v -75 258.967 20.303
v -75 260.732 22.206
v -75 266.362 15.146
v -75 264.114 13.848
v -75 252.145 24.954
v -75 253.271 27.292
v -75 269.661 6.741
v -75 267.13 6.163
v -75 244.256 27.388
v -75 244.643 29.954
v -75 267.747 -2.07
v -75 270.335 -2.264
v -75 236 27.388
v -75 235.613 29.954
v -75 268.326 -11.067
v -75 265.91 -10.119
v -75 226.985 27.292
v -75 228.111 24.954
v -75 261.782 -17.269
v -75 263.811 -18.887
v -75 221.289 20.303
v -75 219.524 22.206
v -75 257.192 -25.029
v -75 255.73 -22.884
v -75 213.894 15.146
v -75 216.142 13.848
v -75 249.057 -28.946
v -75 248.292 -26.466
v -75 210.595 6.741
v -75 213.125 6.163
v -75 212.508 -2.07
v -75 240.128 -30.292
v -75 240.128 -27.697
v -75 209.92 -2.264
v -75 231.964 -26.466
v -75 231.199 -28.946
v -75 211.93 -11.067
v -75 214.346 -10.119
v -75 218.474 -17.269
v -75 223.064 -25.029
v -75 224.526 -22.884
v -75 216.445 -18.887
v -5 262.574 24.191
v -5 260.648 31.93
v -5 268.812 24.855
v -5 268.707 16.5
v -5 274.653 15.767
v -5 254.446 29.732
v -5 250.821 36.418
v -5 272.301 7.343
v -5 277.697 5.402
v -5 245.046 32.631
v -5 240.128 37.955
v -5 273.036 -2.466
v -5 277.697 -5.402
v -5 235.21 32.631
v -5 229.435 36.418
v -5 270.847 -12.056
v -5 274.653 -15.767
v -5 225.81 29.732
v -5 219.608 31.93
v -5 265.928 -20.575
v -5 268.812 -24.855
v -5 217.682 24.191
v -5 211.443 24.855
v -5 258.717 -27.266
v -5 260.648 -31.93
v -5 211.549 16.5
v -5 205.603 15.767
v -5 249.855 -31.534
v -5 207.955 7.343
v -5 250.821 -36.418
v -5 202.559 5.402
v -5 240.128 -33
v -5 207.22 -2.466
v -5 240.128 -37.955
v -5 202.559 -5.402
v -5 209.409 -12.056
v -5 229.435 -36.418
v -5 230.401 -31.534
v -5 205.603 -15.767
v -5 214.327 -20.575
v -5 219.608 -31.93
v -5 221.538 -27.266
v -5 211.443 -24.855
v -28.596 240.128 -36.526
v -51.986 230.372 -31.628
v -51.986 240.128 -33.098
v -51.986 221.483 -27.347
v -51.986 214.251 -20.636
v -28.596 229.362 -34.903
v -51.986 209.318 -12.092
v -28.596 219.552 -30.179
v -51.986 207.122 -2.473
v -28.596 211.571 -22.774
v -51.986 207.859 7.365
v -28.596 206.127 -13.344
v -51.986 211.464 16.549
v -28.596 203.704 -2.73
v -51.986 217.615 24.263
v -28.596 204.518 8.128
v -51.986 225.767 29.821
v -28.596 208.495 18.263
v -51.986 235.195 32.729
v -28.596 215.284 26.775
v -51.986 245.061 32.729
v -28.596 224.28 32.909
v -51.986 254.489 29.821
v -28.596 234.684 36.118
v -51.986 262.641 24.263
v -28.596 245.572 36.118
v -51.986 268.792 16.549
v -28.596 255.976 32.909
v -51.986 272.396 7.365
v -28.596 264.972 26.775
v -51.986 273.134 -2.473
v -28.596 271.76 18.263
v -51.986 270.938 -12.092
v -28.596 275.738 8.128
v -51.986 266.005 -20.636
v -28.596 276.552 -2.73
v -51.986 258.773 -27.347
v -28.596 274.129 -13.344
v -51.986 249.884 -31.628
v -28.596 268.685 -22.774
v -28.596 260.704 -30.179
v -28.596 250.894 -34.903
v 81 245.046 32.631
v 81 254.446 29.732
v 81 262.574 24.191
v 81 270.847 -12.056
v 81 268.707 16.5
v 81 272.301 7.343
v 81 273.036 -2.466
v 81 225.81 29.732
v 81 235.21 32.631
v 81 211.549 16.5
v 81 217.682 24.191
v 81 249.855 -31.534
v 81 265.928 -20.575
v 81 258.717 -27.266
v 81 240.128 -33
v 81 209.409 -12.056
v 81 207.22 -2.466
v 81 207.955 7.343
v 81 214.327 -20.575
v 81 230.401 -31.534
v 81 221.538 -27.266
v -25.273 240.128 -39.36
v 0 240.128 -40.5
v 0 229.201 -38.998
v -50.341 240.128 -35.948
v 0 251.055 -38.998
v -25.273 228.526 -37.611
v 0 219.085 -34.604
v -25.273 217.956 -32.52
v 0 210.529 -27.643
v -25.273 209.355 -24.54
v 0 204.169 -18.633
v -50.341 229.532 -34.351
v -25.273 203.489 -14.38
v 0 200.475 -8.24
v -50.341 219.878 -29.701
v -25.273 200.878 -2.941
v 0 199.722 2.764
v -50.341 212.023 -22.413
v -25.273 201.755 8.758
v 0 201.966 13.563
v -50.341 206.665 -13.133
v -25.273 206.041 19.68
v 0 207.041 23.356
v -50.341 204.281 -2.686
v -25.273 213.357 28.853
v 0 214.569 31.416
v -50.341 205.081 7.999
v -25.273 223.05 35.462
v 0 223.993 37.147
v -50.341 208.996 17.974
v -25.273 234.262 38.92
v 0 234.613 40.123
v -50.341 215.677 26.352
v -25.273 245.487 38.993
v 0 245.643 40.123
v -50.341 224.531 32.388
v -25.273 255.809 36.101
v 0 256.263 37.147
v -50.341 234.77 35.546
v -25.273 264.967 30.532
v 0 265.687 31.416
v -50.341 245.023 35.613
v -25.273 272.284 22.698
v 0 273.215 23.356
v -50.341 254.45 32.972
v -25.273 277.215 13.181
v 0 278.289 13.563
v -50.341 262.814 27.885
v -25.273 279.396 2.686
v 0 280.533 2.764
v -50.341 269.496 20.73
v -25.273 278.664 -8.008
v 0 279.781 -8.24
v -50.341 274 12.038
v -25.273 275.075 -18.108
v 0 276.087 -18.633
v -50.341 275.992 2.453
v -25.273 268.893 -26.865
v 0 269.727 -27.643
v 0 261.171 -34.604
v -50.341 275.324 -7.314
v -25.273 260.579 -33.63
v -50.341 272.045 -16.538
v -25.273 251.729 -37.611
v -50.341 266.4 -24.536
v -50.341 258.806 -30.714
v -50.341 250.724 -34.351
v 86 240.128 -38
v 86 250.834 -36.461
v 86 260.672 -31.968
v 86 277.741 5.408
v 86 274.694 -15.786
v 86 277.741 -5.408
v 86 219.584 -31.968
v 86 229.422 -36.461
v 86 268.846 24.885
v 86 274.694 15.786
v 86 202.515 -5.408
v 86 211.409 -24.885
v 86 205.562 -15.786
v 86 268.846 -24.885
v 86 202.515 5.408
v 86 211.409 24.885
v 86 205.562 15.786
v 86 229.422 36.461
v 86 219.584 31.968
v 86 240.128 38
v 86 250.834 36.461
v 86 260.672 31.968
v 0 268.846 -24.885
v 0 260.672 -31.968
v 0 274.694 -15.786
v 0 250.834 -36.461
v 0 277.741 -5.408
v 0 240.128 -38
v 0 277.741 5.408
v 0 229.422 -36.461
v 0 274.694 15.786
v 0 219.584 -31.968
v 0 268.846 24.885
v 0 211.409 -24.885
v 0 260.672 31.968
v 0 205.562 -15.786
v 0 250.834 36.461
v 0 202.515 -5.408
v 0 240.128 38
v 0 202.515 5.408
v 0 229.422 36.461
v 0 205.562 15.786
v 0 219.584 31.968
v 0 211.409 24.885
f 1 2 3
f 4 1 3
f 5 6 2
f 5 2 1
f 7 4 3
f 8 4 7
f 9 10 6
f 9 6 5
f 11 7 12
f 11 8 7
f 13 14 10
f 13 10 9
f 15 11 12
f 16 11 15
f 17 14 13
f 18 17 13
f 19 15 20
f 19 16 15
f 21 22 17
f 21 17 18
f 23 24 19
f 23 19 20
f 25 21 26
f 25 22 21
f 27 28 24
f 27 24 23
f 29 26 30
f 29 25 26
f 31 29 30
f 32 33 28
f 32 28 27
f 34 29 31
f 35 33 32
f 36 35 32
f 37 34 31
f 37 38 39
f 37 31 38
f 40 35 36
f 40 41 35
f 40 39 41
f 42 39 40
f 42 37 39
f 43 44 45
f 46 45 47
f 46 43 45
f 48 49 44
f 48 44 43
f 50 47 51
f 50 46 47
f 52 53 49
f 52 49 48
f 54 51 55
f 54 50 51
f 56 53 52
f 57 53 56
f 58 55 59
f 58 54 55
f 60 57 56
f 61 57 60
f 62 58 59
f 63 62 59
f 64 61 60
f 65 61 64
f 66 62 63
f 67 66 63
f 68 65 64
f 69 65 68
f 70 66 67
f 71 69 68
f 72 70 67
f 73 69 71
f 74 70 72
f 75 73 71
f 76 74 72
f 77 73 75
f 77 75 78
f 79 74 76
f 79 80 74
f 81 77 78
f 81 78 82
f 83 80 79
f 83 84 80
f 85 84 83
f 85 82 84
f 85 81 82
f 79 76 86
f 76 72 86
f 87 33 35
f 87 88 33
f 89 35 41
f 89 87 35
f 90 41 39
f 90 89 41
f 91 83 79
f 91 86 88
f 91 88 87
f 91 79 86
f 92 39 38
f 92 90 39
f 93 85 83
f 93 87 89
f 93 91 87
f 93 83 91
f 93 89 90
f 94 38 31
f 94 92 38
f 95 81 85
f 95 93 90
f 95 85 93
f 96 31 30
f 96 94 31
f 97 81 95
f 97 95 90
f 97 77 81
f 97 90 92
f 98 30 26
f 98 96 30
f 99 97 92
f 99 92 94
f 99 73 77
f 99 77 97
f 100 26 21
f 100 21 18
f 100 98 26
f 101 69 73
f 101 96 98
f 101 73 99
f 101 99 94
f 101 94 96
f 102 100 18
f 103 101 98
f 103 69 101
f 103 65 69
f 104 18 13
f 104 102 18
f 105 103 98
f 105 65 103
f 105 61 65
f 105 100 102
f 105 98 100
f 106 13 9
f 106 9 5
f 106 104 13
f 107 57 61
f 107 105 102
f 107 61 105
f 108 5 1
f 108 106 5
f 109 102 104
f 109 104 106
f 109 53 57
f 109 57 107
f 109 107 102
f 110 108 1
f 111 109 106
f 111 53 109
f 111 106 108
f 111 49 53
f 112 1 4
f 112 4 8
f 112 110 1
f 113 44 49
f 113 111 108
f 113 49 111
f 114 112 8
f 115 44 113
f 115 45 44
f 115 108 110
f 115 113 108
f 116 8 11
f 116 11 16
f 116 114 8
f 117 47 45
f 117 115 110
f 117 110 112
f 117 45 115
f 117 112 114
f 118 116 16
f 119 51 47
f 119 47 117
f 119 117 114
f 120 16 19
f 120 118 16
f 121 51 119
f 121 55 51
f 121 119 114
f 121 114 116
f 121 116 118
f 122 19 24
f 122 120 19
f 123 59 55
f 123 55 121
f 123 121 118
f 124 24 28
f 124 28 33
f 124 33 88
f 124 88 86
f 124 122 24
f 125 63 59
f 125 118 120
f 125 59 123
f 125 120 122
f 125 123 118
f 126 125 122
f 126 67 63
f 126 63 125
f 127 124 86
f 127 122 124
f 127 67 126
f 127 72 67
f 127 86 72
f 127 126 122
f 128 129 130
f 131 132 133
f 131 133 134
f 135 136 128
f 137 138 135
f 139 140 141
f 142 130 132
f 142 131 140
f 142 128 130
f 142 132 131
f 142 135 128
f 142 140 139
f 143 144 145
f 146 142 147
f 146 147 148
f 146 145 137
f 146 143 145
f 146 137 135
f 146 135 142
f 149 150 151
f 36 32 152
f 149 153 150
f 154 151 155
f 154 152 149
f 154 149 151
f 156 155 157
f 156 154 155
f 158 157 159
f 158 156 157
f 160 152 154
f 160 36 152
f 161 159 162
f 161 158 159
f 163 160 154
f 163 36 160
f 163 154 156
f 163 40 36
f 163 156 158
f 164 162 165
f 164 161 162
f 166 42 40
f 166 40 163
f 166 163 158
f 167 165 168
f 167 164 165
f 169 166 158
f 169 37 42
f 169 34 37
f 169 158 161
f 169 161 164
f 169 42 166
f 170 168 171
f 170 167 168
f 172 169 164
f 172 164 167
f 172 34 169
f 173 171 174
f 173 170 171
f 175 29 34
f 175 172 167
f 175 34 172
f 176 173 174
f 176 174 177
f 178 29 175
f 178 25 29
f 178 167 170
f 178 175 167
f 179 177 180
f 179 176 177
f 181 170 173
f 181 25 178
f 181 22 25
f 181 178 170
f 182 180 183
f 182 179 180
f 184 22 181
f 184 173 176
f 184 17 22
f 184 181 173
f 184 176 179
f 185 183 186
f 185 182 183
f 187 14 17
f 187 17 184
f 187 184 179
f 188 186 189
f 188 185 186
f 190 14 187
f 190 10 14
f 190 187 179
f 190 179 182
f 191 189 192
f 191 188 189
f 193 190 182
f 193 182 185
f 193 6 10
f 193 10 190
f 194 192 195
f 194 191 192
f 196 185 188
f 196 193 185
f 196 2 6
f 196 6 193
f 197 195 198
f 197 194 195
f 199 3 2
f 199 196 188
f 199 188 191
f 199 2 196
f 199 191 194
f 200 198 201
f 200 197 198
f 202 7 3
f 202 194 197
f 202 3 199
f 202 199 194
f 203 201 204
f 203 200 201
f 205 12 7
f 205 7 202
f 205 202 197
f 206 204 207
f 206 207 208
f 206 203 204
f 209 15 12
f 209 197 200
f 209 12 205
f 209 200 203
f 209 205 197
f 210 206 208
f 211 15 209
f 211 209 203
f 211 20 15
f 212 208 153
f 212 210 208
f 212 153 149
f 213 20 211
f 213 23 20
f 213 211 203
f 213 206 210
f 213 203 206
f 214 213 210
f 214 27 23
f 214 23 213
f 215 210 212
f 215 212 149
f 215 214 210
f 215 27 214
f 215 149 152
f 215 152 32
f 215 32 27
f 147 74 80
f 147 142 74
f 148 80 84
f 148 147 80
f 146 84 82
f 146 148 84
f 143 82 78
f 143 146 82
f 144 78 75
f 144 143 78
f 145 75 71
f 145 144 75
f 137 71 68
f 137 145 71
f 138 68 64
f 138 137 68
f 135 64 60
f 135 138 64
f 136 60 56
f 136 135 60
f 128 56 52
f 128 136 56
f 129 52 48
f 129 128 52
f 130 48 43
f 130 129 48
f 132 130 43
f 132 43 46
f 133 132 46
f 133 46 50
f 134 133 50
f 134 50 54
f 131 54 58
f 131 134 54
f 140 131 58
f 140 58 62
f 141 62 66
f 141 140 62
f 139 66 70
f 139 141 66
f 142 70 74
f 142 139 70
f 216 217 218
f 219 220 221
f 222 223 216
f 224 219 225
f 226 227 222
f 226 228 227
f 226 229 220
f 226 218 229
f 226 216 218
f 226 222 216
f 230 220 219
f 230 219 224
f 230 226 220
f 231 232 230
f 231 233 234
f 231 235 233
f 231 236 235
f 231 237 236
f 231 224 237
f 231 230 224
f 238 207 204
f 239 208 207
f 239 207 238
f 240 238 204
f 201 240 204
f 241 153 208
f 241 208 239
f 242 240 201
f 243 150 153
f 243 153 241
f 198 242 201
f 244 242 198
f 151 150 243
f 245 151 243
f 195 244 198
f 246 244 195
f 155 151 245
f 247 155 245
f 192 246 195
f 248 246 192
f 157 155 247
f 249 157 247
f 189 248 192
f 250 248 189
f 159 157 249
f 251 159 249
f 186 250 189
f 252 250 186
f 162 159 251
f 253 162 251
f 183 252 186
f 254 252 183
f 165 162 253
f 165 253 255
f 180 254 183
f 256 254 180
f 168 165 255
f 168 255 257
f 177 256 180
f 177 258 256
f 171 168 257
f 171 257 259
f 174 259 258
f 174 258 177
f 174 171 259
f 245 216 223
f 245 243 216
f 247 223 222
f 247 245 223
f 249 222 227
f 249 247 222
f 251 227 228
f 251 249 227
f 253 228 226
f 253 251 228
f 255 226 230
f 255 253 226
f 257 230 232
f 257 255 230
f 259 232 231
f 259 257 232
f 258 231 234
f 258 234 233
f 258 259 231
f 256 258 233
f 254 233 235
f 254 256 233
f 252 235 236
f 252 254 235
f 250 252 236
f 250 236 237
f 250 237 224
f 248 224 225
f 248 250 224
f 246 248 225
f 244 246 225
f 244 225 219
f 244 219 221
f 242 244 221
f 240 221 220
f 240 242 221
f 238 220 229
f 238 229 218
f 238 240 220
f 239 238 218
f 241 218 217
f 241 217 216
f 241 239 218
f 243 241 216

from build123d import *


with BuildPart() as part:
    # Sketch1 → Revolve1 (revolve)
    with BuildSketch(Plane.XY, mode=Mode.PRIVATE) as revolve1_sk:
        with BuildLine():
            Line((0, 278.127906977), (0, 280.627906977))
            ThreePointArc((0, 280.627906977), (-37.845738323, 278.064241255), (-75, 270.420084635))
            Line((-75, 270.420084635), (-75, 267.824817071))
            ThreePointArc((-75, 267.824817071), (-40.327501461, 275.188708462), (-5, 278.082959994))
            Line((-5, 278.082959994), (-5, 273.127906977))
            Line((-5, 273.127906977), (81, 273.127906977))
            Line((81, 273.127906977), (81, 245.127906977))
            Line((81, 245.127906977), (81, 240.127906977))
            Line((81, 240.127906977), (86, 240.127906977))
            Line((86, 240.127906977), (86, 278.127906977))
            Line((86, 278.127906977), (0, 278.127906977))
        make_face()
    revolve(revolve1_sk.sketch.rotate(Axis((-150, 240.127906977, 0), (-1, 0, 0)), 90), axis=Axis((-150, 240.127906977, 0), (-1, 0, 0)))


solid = part.part
